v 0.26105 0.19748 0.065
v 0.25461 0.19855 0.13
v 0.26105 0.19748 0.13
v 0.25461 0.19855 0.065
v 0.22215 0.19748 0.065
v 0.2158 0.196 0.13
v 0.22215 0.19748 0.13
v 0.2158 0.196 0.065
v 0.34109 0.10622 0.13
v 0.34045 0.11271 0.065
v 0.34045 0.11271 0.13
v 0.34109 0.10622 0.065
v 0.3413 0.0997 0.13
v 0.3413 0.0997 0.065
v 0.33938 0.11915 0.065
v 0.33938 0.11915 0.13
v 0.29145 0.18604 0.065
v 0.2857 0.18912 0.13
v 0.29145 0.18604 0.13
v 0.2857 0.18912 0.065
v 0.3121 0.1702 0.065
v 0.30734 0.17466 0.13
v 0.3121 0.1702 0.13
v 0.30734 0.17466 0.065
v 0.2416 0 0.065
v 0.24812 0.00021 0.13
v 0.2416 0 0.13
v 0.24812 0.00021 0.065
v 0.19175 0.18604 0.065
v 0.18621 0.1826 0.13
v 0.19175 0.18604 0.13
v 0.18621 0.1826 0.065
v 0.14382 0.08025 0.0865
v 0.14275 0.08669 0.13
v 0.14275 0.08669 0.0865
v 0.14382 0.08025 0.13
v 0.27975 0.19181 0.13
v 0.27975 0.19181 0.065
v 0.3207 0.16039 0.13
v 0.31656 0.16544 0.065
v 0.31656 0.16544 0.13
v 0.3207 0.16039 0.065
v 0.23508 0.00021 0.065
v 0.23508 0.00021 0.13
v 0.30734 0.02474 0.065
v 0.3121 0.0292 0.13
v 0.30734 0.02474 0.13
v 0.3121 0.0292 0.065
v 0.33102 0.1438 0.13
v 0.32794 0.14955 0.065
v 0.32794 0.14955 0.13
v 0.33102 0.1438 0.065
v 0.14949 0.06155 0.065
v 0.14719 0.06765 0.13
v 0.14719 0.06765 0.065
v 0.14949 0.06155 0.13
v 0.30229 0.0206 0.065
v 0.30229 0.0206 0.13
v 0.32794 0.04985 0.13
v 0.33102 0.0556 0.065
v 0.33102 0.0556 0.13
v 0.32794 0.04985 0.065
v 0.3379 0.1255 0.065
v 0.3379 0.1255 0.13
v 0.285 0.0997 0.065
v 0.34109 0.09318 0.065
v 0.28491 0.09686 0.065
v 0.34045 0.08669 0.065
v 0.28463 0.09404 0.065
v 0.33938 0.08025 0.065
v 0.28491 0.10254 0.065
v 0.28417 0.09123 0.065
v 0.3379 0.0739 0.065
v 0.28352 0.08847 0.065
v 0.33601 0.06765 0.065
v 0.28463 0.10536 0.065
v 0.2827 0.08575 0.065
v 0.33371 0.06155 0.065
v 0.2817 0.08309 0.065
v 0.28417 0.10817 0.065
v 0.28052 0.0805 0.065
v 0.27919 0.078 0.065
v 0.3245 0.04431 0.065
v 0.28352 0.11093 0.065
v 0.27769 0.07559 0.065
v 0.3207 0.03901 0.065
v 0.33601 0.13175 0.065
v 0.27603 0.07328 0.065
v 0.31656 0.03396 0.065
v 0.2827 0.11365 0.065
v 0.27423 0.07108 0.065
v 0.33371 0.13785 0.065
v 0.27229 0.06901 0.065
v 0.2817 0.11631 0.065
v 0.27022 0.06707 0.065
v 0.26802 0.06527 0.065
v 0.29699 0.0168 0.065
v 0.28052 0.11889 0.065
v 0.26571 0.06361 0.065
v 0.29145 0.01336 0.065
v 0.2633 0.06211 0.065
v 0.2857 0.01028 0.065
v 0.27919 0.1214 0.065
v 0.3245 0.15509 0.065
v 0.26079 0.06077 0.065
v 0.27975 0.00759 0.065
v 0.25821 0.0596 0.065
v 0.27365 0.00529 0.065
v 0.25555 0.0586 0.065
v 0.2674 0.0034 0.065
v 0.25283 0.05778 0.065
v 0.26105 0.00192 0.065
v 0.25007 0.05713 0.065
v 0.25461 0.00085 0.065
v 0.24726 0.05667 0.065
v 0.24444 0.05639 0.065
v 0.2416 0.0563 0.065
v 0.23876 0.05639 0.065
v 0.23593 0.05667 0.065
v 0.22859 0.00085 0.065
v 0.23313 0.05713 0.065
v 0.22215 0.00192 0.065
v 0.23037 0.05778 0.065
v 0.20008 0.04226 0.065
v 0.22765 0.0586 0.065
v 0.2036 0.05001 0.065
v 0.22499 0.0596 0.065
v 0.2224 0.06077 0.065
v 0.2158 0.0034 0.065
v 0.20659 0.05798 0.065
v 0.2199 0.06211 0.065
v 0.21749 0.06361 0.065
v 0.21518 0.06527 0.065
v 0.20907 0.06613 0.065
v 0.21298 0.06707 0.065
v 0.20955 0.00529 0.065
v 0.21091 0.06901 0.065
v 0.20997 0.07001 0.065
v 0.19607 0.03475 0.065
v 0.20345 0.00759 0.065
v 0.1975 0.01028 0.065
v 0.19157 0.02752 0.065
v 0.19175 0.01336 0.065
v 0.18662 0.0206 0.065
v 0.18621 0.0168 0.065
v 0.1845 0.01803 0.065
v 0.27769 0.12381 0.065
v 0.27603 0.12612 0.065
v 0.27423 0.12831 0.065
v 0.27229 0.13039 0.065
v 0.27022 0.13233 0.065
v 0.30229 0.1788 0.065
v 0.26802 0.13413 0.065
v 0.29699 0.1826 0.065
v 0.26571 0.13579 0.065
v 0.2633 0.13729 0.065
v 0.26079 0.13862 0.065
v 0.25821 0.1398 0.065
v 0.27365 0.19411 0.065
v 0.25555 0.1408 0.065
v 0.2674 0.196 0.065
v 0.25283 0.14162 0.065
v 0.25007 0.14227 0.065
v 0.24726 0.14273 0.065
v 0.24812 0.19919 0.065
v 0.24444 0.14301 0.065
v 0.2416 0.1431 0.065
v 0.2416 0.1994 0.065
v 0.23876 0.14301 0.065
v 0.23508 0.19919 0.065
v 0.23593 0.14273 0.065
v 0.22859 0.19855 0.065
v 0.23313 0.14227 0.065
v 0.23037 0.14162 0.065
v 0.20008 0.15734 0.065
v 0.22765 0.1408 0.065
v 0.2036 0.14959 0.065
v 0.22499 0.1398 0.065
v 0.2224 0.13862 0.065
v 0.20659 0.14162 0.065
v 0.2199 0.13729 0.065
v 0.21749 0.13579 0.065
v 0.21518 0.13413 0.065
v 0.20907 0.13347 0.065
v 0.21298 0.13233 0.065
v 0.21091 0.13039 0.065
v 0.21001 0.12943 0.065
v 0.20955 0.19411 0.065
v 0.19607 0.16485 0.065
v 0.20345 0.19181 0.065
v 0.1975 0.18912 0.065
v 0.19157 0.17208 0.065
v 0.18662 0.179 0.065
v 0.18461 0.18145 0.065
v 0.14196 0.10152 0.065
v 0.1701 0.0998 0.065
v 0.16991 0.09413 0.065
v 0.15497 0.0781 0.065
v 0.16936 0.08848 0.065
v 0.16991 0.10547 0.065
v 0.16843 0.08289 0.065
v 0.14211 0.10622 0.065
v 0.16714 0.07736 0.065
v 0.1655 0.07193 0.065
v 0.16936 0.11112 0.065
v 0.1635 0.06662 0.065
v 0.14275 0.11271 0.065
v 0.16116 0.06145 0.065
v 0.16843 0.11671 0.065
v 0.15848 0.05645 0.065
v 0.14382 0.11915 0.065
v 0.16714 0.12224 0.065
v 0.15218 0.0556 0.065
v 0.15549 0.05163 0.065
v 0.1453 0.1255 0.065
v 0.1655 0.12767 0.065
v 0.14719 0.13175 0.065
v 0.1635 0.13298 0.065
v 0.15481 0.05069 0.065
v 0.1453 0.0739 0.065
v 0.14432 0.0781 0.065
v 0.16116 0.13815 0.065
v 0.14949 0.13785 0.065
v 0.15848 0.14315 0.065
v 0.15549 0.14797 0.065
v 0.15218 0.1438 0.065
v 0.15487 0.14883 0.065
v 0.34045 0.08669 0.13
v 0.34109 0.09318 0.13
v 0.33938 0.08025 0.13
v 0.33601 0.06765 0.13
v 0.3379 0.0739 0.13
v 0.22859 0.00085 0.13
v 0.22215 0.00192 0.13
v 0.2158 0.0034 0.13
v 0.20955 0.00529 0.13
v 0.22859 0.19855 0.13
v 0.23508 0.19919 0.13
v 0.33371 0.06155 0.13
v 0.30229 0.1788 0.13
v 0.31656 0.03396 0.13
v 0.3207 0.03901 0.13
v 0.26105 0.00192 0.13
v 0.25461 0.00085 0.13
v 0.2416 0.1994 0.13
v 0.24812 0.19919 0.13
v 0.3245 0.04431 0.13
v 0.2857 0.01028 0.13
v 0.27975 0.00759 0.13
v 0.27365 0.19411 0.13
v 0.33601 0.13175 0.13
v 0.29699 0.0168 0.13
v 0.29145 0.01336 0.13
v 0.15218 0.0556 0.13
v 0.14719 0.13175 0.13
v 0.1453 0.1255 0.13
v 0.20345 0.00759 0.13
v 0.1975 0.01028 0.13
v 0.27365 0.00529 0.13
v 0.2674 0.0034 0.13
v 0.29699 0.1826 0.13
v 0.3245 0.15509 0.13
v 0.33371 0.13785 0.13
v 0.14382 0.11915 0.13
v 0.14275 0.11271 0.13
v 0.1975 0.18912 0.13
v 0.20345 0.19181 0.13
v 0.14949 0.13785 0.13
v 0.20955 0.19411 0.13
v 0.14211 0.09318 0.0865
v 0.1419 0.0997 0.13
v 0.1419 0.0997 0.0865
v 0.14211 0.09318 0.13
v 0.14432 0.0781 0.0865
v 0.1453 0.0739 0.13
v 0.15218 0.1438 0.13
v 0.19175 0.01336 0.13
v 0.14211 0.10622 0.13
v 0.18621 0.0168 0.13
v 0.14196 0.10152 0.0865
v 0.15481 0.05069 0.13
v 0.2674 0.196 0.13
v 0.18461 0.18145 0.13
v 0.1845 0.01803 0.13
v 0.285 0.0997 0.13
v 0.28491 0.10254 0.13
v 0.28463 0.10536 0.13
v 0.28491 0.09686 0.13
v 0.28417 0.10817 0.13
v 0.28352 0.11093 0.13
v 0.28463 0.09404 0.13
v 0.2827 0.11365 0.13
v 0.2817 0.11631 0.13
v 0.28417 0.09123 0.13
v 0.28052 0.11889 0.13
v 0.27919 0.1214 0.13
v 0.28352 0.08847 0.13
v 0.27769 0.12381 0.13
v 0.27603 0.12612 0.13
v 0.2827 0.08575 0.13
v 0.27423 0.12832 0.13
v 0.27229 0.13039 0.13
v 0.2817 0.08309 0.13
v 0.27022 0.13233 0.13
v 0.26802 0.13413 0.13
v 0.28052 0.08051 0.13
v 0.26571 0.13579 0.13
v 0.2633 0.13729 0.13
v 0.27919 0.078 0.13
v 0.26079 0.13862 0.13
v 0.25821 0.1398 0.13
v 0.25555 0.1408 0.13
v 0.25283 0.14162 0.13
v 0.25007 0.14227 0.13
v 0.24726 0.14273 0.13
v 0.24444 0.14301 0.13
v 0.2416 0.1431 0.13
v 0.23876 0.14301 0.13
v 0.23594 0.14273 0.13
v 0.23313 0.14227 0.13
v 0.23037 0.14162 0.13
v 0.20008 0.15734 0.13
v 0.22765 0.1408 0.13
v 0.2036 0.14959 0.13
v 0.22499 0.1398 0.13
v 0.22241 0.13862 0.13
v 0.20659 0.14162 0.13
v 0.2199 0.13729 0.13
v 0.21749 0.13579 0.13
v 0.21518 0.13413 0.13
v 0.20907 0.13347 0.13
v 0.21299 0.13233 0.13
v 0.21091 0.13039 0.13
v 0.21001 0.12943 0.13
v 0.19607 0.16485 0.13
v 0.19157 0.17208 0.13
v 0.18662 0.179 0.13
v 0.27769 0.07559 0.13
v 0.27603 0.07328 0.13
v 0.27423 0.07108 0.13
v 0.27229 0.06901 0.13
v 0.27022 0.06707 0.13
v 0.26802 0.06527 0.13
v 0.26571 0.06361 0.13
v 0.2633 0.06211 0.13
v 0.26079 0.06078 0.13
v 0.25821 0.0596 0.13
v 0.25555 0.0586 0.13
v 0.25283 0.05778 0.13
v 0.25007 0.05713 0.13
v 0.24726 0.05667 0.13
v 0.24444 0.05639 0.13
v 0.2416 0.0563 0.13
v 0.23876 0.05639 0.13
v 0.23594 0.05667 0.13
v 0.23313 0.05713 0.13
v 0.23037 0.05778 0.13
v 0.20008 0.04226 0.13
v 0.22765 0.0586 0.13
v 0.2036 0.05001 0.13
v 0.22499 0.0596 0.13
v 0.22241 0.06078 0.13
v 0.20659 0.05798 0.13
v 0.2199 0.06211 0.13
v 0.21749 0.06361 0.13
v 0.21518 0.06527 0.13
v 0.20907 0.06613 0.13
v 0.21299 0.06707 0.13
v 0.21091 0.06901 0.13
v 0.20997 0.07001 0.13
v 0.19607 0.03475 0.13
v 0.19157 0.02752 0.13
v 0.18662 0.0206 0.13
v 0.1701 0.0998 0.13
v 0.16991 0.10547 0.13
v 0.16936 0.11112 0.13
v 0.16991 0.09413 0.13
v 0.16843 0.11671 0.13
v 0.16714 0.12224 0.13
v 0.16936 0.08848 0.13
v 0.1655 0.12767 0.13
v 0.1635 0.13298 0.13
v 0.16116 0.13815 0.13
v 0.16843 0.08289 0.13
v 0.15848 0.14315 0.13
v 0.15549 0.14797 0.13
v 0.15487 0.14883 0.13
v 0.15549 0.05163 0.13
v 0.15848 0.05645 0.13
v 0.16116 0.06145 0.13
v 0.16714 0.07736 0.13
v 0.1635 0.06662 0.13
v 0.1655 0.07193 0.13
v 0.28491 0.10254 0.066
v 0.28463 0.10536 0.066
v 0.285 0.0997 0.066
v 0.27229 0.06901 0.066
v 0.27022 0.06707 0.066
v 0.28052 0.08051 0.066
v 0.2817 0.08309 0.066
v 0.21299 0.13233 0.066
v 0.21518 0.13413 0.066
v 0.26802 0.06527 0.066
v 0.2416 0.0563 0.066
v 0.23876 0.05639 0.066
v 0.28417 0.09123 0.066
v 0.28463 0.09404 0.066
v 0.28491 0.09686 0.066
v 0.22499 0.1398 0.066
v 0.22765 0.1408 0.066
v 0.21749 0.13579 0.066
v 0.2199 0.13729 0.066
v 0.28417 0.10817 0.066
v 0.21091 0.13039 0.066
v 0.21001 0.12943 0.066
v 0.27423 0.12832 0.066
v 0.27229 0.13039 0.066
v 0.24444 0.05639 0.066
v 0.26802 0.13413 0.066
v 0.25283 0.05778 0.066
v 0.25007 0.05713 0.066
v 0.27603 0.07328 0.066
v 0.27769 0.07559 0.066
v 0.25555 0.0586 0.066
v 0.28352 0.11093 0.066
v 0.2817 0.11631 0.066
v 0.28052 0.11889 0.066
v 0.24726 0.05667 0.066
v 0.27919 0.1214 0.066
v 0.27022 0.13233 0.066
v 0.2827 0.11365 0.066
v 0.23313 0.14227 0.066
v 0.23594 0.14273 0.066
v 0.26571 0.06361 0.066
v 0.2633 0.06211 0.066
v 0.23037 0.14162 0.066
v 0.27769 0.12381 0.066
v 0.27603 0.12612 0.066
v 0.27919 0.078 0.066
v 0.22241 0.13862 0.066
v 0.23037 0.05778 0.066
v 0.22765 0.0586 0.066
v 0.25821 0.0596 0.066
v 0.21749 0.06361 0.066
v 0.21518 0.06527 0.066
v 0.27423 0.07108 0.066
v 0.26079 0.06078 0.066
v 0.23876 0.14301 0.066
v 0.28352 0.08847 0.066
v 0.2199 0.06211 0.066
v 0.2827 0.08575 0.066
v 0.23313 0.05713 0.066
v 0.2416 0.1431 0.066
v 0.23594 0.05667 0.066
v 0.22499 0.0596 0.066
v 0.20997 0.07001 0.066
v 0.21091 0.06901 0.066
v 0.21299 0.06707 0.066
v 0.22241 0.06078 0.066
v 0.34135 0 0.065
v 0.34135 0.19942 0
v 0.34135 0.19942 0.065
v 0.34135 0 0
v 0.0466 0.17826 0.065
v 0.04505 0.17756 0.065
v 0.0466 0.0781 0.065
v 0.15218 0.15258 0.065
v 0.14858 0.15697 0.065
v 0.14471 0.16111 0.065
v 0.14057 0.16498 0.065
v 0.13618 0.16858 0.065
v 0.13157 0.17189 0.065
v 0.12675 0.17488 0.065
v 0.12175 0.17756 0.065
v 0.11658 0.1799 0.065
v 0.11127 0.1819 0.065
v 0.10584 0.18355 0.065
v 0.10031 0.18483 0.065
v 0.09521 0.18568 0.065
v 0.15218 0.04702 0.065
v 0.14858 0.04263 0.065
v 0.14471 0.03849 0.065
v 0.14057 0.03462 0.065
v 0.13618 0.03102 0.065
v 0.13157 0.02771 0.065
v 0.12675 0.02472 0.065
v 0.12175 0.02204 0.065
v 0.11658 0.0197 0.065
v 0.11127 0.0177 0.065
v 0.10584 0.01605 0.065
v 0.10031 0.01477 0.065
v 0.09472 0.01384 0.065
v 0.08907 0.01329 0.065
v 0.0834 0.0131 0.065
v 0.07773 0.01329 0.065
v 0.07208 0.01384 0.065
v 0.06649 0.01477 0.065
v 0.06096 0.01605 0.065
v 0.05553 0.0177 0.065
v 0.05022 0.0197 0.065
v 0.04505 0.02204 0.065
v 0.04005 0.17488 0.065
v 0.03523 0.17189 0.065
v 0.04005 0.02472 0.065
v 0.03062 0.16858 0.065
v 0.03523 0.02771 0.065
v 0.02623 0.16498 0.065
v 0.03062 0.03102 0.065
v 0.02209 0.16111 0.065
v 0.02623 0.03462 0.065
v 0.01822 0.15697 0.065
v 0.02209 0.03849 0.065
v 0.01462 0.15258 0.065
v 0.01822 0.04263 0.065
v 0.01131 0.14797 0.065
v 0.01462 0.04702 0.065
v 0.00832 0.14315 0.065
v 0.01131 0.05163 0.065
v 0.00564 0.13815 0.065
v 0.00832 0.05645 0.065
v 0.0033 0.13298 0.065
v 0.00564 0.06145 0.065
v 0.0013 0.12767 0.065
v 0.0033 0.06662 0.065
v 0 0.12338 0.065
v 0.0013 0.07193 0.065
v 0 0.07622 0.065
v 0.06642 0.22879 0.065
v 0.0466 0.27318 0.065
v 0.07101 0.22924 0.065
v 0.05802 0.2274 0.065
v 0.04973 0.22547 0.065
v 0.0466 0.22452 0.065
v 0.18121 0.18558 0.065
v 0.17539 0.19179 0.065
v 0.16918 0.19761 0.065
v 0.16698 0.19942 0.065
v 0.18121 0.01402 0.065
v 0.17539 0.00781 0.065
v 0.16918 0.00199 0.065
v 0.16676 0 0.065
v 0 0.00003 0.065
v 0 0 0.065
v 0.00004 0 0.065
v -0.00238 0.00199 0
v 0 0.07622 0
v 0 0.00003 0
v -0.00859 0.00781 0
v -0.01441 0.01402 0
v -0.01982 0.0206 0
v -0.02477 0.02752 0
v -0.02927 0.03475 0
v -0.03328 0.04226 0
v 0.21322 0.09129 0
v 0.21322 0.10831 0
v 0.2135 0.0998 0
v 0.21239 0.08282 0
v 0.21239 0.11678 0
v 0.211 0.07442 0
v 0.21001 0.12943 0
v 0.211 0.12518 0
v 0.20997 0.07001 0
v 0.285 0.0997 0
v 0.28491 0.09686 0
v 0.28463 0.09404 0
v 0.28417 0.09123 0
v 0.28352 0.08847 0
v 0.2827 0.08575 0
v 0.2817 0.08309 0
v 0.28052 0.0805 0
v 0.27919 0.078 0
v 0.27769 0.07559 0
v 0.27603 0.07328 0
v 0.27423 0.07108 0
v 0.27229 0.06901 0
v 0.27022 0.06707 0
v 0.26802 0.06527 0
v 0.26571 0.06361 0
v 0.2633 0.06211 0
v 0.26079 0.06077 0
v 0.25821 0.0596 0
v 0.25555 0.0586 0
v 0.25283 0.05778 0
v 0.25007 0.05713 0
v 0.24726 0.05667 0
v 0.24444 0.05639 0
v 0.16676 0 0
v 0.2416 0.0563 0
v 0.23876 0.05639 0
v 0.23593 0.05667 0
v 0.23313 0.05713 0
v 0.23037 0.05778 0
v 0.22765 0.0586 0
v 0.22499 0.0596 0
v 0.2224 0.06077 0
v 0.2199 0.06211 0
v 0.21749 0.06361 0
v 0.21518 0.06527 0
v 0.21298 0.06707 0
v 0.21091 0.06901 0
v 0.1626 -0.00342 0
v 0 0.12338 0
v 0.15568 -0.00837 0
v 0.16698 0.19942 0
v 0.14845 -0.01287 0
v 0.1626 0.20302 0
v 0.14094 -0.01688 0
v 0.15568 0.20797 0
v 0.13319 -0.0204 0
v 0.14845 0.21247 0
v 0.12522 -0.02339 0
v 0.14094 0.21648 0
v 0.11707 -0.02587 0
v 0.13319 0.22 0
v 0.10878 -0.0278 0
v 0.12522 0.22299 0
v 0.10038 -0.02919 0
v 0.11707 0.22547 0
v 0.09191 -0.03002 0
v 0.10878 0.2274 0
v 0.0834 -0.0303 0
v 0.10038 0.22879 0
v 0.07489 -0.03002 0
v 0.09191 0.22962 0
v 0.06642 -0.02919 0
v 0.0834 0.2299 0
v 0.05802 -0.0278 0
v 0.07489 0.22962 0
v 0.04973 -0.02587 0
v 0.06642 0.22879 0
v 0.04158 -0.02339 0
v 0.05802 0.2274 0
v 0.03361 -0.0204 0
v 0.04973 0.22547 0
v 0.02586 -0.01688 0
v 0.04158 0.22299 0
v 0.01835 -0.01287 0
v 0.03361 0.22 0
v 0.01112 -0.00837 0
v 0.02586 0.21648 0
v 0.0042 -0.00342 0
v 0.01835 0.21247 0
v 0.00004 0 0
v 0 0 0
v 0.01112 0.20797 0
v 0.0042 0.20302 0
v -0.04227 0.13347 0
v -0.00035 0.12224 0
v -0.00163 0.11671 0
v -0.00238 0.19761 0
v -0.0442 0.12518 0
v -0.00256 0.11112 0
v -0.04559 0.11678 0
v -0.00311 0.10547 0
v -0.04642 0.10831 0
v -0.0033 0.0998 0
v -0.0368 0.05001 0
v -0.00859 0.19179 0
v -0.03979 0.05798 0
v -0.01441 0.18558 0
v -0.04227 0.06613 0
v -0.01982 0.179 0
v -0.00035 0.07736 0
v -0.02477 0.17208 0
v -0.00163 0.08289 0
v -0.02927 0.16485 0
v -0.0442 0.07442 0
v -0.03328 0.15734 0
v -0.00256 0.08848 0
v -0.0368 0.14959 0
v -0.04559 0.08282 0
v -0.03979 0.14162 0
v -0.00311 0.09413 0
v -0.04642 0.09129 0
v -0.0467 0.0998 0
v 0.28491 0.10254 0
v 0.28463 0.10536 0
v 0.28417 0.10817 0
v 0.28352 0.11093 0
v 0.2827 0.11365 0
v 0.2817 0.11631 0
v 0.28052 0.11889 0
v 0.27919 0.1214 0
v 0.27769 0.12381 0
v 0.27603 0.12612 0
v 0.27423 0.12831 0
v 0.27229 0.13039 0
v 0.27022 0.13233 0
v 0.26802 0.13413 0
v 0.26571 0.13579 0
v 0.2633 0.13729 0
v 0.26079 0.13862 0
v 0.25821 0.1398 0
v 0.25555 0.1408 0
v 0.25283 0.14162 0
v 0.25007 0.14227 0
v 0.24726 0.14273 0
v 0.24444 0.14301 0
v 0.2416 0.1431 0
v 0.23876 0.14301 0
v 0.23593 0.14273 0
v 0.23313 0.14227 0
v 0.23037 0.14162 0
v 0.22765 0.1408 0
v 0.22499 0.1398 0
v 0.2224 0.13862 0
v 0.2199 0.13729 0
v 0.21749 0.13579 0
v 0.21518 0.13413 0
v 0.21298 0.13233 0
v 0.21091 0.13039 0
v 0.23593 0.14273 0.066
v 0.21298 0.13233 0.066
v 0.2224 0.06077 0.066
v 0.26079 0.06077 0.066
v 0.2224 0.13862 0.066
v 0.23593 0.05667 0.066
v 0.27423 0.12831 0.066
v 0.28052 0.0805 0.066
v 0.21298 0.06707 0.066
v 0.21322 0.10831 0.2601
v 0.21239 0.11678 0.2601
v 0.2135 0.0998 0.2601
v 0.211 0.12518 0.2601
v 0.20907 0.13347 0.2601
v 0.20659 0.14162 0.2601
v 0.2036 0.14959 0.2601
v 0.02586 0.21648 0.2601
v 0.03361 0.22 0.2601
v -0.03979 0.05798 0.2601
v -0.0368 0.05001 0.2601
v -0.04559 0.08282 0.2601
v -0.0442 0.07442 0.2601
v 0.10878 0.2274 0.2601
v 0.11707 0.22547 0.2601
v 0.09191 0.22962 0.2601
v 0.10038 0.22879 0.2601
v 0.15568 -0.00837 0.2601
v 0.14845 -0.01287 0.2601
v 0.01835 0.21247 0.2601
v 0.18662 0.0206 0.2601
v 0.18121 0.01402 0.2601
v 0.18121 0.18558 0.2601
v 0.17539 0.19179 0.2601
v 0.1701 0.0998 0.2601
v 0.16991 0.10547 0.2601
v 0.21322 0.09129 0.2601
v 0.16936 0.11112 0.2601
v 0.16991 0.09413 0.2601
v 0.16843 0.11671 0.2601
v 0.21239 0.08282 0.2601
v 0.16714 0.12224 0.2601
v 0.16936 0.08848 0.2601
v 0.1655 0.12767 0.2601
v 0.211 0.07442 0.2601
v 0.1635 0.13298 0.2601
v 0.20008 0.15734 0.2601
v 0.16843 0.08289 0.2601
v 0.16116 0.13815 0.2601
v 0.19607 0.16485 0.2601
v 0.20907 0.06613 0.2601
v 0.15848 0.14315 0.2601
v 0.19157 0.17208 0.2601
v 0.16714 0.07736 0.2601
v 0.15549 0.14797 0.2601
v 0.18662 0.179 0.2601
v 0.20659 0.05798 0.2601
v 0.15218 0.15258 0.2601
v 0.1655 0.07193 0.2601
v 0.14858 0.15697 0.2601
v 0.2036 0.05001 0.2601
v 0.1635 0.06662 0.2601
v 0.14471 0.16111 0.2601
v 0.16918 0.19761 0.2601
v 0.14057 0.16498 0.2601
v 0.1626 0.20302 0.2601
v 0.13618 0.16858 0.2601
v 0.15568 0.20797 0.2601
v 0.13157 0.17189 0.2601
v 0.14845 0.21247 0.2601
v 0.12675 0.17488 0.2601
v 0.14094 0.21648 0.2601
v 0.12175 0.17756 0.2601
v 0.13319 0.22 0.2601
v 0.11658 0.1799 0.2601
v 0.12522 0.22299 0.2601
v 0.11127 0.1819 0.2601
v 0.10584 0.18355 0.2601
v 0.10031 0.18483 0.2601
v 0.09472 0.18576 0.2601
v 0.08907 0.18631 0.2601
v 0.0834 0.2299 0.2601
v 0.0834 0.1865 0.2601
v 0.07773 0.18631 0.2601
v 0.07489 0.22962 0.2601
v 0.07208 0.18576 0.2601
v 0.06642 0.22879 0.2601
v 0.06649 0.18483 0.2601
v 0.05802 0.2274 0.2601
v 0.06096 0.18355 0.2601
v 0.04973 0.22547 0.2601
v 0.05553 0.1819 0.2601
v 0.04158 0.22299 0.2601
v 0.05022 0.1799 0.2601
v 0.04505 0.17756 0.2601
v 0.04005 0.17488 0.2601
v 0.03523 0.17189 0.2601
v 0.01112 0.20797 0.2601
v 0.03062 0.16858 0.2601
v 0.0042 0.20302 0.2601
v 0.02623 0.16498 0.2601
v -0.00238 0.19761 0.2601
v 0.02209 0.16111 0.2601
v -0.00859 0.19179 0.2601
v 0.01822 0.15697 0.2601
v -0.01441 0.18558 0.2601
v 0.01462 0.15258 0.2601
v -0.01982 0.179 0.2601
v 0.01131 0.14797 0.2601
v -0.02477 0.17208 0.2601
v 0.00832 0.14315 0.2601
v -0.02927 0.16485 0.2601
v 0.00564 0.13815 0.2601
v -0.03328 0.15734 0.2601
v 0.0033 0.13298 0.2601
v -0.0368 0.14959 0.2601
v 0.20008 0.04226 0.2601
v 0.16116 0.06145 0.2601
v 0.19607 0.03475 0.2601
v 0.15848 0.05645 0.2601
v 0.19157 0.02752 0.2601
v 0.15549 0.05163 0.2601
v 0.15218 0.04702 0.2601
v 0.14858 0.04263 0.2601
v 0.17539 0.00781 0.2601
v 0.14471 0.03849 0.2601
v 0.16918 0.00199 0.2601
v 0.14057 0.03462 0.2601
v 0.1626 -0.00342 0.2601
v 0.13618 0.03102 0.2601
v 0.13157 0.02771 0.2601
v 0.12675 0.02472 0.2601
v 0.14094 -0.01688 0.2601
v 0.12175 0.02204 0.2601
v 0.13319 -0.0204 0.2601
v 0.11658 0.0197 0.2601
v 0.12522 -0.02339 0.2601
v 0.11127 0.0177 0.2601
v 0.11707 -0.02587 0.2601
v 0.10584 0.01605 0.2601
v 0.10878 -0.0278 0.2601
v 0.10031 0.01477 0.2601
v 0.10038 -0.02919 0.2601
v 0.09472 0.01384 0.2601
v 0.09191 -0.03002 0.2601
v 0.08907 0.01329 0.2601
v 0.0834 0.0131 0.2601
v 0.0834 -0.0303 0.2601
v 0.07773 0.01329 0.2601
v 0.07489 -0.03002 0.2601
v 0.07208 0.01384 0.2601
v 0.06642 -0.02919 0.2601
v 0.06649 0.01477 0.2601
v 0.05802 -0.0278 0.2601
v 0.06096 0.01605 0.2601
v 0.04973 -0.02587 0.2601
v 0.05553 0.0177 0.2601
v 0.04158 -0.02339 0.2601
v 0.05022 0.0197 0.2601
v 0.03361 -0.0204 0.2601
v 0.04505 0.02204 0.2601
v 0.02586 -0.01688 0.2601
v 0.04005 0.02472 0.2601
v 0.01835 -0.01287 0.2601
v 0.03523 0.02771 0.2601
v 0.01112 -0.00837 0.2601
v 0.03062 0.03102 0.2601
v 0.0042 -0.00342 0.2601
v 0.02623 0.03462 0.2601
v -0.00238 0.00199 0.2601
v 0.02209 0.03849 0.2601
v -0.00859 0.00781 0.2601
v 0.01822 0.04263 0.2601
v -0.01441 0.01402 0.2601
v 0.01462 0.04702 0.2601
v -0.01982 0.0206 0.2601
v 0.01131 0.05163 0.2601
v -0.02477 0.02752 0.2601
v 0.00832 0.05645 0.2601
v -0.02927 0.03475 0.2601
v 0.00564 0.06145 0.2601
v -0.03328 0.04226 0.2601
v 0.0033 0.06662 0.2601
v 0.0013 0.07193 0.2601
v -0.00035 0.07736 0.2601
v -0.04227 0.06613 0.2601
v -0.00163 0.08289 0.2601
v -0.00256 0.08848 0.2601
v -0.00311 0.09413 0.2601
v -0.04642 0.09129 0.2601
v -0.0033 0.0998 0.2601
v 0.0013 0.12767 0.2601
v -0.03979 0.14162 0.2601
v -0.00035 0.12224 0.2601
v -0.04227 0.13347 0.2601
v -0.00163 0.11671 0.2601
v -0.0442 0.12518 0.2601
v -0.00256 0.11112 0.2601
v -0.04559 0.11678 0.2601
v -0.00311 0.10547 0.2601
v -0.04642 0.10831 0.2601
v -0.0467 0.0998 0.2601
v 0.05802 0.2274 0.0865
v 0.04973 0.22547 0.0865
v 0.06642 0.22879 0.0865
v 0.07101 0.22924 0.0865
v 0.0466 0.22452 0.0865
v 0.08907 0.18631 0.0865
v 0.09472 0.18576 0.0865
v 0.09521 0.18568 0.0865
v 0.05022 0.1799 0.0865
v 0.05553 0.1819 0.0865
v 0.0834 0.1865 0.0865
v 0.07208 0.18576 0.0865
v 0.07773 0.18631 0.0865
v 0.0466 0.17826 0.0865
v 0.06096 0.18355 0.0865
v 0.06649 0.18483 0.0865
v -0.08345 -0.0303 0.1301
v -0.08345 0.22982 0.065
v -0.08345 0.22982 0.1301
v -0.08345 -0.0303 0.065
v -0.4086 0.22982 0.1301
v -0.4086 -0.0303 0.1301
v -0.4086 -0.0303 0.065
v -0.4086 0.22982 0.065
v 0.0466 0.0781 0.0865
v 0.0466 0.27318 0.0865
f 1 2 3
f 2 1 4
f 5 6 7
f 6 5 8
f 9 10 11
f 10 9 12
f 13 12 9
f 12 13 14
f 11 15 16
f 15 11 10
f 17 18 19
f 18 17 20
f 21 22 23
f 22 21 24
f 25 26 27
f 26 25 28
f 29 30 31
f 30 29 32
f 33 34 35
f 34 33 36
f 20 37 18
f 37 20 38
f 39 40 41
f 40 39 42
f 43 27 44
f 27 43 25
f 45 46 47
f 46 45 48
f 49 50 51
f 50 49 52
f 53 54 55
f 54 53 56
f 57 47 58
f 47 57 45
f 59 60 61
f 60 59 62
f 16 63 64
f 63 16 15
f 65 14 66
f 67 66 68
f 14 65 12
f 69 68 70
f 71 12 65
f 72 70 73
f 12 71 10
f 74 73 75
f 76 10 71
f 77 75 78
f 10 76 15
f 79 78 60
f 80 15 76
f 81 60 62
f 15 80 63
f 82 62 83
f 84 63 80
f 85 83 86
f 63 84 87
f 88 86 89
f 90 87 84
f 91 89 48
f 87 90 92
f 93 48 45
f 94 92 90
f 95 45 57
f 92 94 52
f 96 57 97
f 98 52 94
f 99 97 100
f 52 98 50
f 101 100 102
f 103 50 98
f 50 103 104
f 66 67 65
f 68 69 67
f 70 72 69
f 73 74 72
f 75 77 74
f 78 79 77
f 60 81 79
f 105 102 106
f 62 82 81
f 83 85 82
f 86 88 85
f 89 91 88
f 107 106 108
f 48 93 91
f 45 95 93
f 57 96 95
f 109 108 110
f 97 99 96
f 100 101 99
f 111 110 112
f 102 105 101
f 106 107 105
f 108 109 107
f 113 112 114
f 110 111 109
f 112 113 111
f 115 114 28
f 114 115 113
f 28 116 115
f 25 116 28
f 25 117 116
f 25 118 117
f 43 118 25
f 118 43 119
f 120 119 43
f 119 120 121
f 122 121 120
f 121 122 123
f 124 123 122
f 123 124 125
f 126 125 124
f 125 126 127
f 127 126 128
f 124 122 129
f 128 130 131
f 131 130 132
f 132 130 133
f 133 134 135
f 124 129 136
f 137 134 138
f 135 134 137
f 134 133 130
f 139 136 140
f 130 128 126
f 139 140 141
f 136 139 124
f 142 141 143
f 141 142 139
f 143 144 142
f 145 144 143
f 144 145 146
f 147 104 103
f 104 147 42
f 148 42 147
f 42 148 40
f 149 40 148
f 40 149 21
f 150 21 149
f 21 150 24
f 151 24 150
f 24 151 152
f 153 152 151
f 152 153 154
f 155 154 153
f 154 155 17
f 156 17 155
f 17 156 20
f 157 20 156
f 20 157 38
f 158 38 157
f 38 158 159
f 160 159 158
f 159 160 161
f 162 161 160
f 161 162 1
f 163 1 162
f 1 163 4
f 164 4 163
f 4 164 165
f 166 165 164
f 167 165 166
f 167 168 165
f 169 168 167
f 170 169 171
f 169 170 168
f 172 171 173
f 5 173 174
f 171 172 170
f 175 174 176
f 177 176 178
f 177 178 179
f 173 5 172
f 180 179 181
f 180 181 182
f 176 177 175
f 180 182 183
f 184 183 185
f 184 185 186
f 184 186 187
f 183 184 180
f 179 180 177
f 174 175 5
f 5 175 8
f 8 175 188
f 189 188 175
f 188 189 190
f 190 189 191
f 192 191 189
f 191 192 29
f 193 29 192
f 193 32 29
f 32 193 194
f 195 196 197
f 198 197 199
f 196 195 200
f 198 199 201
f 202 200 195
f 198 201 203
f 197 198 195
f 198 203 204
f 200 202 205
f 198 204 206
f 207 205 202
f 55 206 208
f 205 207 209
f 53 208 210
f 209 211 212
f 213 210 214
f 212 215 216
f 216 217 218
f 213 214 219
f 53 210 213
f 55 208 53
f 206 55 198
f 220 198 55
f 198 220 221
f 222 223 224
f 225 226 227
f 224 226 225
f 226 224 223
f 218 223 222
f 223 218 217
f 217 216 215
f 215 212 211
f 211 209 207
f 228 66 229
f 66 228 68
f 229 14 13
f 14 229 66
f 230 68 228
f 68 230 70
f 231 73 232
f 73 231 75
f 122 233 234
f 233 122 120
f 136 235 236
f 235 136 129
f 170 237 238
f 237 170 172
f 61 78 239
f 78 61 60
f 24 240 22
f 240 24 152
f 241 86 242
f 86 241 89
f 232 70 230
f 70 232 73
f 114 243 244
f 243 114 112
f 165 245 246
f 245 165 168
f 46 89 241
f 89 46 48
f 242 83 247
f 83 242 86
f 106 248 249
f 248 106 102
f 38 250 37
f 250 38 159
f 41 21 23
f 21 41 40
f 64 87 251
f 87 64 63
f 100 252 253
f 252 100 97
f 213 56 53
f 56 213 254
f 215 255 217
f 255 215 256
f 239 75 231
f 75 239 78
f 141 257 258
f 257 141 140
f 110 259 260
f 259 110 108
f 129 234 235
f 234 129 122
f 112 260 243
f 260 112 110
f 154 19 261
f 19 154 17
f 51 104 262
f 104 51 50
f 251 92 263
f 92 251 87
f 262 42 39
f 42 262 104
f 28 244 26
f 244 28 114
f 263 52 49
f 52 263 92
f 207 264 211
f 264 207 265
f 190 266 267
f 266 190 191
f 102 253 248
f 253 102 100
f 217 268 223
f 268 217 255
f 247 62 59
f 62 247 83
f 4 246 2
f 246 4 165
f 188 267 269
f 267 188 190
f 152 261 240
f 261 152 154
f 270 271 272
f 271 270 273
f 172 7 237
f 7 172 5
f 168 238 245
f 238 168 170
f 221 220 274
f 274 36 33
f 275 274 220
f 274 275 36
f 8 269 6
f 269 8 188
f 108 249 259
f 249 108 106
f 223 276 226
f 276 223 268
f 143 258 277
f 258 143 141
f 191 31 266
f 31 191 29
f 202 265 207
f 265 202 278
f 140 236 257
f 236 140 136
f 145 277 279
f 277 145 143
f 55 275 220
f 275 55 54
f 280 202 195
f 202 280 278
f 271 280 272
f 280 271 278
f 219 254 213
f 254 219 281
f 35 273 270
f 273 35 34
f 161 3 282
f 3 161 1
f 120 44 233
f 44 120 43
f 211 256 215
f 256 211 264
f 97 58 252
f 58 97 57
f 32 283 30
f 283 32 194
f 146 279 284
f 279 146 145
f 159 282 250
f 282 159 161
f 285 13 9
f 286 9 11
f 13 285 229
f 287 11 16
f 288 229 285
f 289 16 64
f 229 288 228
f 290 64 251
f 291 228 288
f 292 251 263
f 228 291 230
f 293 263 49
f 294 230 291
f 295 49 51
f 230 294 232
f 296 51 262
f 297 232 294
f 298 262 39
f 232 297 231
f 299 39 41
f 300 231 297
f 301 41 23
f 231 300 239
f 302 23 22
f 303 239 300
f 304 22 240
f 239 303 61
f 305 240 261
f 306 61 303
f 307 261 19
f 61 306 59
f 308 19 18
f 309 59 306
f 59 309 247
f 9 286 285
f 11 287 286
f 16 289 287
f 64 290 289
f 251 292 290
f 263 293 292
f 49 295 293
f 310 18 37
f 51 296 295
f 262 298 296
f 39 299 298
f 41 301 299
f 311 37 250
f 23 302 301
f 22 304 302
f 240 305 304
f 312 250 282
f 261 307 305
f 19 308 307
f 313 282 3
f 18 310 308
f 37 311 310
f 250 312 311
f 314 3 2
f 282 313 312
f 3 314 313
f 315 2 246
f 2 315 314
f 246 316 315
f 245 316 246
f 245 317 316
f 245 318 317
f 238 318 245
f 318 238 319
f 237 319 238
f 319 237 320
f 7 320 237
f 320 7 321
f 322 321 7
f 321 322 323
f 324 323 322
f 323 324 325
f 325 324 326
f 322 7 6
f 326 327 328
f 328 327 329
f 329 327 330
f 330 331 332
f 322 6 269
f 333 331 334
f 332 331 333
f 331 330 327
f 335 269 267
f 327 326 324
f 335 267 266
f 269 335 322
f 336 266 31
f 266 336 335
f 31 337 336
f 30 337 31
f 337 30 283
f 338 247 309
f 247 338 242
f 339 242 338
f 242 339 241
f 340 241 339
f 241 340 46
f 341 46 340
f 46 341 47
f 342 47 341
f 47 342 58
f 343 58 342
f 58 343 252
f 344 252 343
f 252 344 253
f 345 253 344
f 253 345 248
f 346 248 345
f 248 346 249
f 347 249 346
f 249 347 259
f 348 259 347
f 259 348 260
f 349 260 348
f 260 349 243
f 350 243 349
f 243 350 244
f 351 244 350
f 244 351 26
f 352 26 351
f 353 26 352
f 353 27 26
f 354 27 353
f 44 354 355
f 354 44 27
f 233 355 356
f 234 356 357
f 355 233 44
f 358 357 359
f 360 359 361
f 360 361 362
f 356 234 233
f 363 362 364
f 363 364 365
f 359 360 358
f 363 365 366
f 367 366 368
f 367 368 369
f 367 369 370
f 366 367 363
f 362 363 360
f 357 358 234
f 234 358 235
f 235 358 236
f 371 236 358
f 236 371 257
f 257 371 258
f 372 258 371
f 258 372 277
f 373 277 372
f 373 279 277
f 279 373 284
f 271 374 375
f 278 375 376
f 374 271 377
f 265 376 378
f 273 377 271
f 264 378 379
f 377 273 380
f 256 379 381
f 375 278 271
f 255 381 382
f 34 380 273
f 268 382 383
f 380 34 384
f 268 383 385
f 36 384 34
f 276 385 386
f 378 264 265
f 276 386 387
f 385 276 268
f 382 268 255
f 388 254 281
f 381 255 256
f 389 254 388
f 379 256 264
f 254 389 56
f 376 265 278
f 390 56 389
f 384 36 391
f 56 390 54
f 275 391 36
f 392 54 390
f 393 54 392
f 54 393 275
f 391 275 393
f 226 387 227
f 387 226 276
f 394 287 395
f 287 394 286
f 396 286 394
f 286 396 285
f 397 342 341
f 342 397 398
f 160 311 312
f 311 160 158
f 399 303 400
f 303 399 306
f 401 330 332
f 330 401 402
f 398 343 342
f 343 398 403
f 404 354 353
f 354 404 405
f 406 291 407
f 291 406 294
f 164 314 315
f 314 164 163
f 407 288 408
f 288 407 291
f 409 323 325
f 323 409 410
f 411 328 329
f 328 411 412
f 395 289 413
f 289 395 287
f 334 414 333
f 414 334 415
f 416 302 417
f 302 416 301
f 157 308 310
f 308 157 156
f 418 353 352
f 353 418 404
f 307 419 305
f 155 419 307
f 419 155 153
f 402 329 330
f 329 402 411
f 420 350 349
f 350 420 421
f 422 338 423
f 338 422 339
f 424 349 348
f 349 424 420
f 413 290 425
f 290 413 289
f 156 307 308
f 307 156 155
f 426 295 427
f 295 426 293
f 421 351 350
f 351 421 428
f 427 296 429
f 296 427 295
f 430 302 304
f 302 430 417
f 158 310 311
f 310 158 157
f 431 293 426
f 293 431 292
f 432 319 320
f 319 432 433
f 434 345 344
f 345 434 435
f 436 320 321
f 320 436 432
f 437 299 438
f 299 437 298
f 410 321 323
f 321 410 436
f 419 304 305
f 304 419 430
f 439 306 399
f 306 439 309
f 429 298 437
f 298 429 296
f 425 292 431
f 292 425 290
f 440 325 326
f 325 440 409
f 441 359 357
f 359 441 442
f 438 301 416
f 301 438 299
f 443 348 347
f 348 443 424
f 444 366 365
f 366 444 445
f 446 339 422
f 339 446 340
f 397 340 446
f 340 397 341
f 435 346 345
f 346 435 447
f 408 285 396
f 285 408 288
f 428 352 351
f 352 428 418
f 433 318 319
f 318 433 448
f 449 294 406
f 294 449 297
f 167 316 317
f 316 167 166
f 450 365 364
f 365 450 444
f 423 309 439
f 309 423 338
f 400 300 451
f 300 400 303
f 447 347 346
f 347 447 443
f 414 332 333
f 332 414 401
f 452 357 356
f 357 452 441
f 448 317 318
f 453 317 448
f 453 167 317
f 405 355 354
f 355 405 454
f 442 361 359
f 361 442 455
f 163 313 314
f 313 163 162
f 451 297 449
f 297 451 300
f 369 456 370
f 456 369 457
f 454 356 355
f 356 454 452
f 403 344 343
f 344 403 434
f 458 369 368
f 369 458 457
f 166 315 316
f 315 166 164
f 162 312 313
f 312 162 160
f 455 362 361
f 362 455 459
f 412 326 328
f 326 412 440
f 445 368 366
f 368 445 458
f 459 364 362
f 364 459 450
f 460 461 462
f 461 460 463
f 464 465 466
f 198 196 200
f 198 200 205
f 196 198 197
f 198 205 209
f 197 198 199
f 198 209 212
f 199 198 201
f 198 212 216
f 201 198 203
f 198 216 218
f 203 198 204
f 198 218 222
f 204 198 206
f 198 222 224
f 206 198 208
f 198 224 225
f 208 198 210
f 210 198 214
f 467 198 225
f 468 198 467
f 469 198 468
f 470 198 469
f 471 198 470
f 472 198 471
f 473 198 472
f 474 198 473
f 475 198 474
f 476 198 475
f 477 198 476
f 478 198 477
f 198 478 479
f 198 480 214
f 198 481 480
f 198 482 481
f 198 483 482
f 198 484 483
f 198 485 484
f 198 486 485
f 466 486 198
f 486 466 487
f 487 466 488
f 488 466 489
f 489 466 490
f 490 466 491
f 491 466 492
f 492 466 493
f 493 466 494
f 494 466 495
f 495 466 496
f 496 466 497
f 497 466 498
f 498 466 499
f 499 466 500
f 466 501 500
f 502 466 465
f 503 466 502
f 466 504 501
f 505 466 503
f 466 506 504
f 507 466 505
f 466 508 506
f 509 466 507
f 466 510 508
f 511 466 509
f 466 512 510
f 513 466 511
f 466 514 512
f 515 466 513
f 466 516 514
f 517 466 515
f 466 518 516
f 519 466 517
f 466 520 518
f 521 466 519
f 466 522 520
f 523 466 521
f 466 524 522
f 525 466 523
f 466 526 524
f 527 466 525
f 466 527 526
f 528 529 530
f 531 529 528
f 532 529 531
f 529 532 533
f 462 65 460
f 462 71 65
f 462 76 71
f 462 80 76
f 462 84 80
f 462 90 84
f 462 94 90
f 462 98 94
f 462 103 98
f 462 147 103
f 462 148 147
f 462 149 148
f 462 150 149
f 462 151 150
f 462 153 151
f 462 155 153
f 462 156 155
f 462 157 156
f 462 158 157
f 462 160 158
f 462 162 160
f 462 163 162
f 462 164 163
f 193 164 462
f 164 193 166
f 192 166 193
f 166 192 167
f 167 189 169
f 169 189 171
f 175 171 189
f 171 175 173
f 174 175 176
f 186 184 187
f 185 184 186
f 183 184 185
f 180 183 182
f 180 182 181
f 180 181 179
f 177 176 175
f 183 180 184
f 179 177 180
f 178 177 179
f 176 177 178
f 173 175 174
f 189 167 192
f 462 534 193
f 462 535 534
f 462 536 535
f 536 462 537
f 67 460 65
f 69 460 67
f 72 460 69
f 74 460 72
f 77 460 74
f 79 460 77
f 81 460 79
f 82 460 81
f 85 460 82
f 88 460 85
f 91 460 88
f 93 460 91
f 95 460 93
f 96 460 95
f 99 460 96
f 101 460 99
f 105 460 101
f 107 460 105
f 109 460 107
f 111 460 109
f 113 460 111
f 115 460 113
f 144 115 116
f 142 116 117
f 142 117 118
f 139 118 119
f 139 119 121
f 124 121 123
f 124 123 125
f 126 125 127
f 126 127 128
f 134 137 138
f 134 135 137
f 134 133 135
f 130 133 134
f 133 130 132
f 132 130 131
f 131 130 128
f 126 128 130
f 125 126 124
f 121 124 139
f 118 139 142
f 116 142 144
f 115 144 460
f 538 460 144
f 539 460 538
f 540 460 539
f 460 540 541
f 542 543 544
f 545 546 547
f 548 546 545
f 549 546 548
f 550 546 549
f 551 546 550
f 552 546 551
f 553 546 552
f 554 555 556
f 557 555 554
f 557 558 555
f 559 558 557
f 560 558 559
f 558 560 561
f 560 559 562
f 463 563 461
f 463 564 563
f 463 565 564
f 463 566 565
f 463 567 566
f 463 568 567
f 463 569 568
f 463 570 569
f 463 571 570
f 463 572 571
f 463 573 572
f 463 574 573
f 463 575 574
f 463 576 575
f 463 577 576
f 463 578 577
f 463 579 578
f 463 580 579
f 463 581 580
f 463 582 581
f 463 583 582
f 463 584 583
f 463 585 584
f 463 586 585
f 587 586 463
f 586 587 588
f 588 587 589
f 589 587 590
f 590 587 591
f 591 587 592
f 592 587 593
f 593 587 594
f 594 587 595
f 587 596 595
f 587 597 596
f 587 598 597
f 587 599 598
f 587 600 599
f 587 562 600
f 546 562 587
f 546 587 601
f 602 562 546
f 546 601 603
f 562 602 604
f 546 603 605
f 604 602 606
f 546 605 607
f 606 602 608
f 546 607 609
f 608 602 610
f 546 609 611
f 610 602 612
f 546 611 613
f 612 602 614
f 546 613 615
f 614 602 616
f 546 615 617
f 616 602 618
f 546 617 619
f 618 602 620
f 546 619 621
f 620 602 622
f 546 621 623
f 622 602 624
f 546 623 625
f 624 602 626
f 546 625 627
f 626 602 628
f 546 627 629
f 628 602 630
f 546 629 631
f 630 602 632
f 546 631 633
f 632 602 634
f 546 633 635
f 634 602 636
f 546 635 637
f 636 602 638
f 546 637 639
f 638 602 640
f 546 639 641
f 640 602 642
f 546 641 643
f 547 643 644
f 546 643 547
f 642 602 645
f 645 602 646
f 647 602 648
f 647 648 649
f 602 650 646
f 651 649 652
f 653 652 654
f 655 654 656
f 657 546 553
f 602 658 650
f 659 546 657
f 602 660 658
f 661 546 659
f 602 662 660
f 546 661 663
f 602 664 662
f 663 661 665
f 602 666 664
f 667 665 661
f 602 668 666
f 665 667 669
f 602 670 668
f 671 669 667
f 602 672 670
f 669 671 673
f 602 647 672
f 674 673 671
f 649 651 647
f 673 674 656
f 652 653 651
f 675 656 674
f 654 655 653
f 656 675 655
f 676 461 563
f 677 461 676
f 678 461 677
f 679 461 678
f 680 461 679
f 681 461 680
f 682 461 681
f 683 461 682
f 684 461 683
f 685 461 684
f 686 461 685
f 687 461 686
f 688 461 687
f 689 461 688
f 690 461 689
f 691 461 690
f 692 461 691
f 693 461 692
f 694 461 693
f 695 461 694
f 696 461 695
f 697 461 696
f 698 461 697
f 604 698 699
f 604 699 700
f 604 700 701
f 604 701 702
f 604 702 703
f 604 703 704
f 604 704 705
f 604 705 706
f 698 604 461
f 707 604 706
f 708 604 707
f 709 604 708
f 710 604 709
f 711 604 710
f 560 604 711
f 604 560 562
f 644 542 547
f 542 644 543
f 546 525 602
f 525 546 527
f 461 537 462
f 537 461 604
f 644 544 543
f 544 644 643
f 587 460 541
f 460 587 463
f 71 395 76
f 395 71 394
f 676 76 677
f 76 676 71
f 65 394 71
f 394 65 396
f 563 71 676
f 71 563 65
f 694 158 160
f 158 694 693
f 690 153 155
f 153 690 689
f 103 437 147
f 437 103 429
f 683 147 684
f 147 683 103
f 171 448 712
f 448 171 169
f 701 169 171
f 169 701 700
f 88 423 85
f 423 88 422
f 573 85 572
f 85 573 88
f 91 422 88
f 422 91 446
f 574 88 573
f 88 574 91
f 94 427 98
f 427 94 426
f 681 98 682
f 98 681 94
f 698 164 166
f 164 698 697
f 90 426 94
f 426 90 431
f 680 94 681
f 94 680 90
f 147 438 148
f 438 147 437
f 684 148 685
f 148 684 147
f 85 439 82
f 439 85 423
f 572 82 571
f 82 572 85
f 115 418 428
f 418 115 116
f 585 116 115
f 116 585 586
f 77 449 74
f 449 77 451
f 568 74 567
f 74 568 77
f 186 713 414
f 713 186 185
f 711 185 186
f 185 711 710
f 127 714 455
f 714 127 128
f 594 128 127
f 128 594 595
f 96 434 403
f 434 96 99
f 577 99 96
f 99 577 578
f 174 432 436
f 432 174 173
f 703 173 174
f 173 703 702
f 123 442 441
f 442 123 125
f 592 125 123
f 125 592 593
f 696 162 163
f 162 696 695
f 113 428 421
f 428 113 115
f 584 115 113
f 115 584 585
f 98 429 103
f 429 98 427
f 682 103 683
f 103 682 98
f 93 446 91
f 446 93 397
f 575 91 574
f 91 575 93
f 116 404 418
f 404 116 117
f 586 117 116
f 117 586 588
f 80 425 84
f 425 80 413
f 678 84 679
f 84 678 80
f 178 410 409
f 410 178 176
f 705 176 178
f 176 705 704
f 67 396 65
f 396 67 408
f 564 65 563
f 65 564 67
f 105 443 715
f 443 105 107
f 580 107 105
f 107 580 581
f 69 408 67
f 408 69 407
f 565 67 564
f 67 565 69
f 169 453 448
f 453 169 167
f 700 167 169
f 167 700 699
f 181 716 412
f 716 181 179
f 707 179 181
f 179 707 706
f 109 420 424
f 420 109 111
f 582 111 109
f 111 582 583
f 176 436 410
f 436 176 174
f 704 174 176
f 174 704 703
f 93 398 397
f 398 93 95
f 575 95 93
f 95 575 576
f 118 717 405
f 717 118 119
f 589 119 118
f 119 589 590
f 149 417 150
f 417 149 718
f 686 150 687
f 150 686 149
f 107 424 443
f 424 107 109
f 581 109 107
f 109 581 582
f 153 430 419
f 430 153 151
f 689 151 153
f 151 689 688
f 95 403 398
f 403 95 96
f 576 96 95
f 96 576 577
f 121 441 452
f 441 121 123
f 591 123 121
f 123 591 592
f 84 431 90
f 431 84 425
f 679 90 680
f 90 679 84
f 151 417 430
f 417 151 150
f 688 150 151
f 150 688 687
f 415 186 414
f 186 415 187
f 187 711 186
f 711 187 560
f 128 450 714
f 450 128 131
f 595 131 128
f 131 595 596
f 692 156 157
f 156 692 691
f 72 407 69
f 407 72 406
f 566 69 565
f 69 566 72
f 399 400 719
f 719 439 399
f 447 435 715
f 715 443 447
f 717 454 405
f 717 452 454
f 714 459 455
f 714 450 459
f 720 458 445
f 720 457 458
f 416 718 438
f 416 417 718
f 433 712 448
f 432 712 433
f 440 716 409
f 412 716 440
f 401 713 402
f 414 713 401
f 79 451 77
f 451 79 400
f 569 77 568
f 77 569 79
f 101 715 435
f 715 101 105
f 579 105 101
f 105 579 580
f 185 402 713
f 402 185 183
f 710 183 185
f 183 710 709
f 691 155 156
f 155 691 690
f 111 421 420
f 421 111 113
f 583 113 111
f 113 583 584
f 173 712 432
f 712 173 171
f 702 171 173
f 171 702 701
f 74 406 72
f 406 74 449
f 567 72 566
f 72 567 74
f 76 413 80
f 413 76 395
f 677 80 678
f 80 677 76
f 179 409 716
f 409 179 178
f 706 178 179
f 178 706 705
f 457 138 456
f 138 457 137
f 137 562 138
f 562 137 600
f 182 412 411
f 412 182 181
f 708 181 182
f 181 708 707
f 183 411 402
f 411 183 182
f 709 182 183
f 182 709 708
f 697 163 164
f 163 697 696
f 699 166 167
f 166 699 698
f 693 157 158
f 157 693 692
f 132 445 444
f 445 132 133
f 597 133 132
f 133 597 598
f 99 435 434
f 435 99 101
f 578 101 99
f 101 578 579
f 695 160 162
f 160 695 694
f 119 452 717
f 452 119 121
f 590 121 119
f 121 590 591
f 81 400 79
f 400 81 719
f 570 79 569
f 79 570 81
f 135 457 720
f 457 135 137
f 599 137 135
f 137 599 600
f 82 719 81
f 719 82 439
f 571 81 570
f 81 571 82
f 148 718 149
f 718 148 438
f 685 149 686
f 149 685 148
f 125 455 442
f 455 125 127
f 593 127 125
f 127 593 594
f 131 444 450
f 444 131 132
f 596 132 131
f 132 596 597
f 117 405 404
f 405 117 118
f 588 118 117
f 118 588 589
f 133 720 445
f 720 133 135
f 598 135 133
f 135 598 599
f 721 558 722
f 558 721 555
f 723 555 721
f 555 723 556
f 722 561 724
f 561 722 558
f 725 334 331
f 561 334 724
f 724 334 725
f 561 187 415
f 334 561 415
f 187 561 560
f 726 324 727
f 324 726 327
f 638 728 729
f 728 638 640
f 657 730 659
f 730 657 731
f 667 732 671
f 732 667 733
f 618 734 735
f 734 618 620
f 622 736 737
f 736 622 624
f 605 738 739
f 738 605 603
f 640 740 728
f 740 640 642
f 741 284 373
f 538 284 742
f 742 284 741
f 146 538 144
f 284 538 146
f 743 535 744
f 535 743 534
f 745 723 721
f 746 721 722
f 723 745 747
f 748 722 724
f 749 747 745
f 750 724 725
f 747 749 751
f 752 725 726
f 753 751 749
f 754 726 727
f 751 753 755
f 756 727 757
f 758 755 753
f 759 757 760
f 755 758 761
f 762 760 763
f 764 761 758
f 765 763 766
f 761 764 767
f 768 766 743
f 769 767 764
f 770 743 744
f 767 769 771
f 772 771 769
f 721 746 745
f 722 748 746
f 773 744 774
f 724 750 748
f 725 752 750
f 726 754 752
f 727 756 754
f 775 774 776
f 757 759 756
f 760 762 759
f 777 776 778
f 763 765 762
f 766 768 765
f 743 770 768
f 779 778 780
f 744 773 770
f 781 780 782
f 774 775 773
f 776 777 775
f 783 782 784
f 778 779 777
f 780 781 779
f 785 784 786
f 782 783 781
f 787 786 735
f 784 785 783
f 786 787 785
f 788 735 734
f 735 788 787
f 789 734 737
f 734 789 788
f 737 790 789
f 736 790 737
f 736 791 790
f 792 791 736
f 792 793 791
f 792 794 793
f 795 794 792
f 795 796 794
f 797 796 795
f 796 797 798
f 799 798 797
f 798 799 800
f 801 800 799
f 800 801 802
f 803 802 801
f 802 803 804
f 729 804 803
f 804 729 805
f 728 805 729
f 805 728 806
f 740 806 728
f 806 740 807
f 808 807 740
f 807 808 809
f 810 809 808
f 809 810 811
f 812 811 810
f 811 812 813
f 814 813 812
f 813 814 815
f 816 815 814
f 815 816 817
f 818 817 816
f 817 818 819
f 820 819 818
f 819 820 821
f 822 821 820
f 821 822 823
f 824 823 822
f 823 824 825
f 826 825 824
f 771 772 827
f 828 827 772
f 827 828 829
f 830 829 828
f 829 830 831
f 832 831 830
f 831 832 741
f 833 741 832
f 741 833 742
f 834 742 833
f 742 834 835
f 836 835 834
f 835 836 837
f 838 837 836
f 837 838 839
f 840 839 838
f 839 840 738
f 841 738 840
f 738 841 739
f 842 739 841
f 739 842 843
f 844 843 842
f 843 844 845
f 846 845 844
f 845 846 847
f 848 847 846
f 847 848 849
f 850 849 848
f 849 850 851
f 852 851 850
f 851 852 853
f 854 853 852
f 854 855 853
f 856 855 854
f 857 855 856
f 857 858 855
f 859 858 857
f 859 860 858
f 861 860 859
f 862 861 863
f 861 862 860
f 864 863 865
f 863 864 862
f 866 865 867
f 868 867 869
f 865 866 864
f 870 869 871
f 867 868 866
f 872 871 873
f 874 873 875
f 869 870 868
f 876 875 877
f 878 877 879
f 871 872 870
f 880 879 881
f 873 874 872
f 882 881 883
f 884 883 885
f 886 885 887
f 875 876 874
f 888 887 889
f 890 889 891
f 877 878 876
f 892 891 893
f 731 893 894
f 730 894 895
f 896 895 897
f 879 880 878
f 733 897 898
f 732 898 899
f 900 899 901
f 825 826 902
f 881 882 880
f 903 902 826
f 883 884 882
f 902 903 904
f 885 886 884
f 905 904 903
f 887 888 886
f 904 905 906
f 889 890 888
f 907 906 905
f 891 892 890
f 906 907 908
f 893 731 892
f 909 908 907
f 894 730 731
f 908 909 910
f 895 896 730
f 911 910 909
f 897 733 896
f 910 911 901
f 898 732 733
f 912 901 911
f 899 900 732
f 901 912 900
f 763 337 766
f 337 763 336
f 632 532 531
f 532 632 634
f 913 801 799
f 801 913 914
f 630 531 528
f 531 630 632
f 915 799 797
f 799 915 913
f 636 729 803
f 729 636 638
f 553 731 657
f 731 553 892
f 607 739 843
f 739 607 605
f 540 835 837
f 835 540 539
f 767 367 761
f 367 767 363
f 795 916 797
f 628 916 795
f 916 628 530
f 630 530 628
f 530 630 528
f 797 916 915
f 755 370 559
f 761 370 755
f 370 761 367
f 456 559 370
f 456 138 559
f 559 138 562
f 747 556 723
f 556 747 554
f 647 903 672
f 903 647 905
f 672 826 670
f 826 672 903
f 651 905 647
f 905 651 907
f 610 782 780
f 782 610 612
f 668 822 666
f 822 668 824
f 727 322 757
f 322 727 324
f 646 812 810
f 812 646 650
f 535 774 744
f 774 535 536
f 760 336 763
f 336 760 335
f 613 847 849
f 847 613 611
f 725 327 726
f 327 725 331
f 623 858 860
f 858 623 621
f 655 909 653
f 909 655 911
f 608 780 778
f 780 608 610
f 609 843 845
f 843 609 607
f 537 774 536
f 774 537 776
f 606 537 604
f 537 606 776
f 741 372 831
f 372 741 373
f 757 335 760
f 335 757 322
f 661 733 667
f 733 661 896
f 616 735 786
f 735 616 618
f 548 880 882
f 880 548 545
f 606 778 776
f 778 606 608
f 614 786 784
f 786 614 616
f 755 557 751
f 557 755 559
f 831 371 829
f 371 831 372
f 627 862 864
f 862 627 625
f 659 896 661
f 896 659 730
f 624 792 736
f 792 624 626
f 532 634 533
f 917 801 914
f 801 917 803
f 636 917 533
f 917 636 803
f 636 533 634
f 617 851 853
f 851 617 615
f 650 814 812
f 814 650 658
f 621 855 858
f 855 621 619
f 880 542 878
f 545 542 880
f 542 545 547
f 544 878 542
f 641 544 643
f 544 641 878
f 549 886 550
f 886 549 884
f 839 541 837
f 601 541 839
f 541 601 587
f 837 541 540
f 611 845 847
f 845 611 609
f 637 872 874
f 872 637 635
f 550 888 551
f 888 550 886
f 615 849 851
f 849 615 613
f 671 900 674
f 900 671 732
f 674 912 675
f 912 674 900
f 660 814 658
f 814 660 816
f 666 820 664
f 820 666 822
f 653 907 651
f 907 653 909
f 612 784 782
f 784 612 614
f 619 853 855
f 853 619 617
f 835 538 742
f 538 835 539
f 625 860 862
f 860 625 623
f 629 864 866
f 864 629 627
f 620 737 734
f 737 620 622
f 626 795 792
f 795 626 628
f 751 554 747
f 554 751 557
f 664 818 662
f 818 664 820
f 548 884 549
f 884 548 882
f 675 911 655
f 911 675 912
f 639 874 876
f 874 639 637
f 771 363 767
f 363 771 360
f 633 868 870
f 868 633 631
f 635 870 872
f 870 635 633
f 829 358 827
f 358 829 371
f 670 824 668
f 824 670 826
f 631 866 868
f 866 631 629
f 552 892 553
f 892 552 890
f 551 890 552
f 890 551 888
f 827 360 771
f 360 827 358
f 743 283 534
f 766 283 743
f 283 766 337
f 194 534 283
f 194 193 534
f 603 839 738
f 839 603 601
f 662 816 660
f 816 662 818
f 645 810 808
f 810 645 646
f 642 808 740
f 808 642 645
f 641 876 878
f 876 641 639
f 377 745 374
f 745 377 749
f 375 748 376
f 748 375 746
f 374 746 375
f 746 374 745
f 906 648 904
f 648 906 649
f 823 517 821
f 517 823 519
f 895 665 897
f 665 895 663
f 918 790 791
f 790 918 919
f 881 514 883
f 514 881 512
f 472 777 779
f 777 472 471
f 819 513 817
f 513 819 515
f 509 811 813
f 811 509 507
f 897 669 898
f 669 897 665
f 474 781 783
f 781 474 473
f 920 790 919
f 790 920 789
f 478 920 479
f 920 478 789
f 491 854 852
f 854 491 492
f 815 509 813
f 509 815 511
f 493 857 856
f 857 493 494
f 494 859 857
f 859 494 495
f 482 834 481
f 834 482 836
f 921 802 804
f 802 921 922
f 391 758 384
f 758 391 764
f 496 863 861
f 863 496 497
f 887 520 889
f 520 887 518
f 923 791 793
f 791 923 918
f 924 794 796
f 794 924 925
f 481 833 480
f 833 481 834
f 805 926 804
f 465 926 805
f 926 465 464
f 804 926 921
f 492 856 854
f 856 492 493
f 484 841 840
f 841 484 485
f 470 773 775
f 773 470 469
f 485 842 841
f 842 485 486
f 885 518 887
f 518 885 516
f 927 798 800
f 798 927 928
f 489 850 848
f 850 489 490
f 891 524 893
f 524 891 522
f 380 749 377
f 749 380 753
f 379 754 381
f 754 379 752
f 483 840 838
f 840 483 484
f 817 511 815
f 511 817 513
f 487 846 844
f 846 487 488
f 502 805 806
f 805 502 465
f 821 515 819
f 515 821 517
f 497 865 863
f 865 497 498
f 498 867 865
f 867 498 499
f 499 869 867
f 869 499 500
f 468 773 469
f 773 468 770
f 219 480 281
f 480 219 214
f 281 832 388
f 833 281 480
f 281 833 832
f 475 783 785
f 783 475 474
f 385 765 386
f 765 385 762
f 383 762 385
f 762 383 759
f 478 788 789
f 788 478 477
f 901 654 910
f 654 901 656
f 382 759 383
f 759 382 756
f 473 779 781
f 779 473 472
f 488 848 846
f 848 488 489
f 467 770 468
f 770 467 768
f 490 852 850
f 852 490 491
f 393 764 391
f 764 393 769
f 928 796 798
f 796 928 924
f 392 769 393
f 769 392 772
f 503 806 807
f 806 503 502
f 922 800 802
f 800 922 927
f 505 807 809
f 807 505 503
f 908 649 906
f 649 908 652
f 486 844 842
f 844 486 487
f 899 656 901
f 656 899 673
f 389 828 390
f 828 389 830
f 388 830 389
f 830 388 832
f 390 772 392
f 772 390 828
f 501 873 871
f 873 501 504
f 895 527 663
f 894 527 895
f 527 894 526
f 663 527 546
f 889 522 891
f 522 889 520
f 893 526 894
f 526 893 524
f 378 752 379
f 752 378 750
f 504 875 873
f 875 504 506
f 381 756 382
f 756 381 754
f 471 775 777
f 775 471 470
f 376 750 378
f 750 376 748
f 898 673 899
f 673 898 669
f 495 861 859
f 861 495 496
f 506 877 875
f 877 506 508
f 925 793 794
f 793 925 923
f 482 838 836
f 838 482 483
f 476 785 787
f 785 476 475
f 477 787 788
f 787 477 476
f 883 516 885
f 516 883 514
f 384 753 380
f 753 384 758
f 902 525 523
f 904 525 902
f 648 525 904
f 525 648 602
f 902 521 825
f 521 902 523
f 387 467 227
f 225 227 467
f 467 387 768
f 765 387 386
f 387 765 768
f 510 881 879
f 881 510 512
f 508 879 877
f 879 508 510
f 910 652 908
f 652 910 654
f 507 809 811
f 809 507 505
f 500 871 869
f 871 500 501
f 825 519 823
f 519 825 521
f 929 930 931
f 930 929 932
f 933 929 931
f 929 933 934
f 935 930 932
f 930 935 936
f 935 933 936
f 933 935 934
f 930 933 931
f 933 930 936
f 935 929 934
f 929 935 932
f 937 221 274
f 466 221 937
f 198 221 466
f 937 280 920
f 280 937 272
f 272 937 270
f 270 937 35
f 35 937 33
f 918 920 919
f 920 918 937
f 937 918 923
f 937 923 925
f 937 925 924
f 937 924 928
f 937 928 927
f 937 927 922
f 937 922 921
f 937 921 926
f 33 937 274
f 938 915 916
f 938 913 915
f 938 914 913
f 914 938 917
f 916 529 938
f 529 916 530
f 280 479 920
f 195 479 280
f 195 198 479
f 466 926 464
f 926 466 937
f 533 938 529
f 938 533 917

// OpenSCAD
// ============================================================
// Parametric Assembly: base + annular boss + hollow sleeve +
// stepped arm + triangular web
// ============================================================

$fn = 96;

// ---- Main base ----
base_L   = 0.341352;
base_W   = 0.199422;
base_H   = 0.065029;
base_ext = 0.065;

// ---- Low annular boss on top of base ----
boss_cx  = 0.2416;   // from left edge of base
boss_cy  = 0.0997;   // from front edge of base
boss_ro  = 0.0997;
boss_ri  = 0.0434;

// ---- Tall hollow sleeve ----
sleeve_cx_off = -0.0834;  // relative to base left reference
sleeve_cy_off =  0.0998;  // relative to base front reference
sleeve_ro     =  0.1301;
sleeve_ri     =  0.0867;
sleeve_H      =  0.2601;

// ---- Projecting stepped arm ----
arm_L         = 0.325145;
arm_W         = 0.260116;
arm_H_top     = 0.1301;   // upward reach
arm_left_off  = -0.4086;  // left edge from base left reference
arm_front_off = -0.0303;  // front edge from base front reference
arm_cut_lo    = 0.0;      // remove lower band 0..0.065
arm_cut_hi    = 0.065;

// ---- Triangular web ----
web_thk        = 0.0217;
web_left_lo    = 0.0466;
web_left_hi    = 0.1863;
web_front_lo   = 0.0781;
web_front_hi   = 0.0996;
web_run        = 0.108382;
web_rise_span  = 0.195087;

// ============================================================
// MODULES
// ============================================================

// Base plate with the low annular boss on top, inner hole through.
module base_with_boss() {
    difference() {
        union() {
            // base slab
            cube([base_L, base_W, base_ext]);
            // low annular ring sitting on top
            translate([boss_cx, boss_cy, base_ext])
                difference() {
                    cylinder(h = base_ext, r = boss_ro);
                    translate([0,0,-0.001])
                        cylinder(h = base_ext + 0.002, r = boss_ri);
                }
        }
        // through-hole in inner profile across the 0.065 thickness
        translate([boss_cx, boss_cy, -0.001])
            cylinder(h = base_ext + 0.002, r = boss_ri);
    }
}

// Tall hollow sleeve, concentric annular cylinder rising from base
module hollow_sleeve() {
    cx = sleeve_cx_off + 0.2602/2 + 0.0; // not used; explicit center below
    // Use the explicit "center offset" given in the spec
    translate([ -sleeve_cx_off,   // -(-0.0834) ... interpret as offset from ref
                sleeve_cy_off, 0 ]) {
        // (Center placed using the stated offsets from the base reference.)
    }
    // Place sleeve using the stated center offsets
    translate([ -sleeve_cx_off, sleeve_cy_off, 0 ])
        difference() {
            cylinder(h = sleeve_H, r = sleeve_ro);
            translate([0,0,-0.001])
                cylinder(h = sleeve_H + 0.002, r = sleeve_ri);
        }
}

// Stepped arm: full block from cut_hi up to arm_H_top, on the side of base.
module stepped_arm() {
    // Arm footprint placed using its left/front offsets relative to base ref
    translate([ arm_left_off, arm_front_off, arm_cut_hi ])
        cube([ arm_L, arm_W, arm_H_top - arm_cut_hi ]);
}

// Triangular web (right-triangle prism) on top of base, rising toward sleeve.
module triangular_web() {
    // Footprint extents
    dx = web_left_hi - web_left_lo;            // plan run direction
    dy = web_front_hi - web_front_lo;          // material thickness band
    // Use side-profile triangle: run = web_run (x), rise = web_rise_span (z)
    translate([ web_left_lo, web_front_lo, base_ext ])
        linear_extrude(height = dy)            // thickness in Y-ish direction
            polygon(points = [
                [0, 0],
                [web_run, 0],
                [0, web_rise_span]
            ]);
}

// ============================================================
// ASSEMBLY
// ============================================================
union() {
    base_with_boss();
    hollow_sleeve();
    stepped_arm();
    triangular_web();
}
